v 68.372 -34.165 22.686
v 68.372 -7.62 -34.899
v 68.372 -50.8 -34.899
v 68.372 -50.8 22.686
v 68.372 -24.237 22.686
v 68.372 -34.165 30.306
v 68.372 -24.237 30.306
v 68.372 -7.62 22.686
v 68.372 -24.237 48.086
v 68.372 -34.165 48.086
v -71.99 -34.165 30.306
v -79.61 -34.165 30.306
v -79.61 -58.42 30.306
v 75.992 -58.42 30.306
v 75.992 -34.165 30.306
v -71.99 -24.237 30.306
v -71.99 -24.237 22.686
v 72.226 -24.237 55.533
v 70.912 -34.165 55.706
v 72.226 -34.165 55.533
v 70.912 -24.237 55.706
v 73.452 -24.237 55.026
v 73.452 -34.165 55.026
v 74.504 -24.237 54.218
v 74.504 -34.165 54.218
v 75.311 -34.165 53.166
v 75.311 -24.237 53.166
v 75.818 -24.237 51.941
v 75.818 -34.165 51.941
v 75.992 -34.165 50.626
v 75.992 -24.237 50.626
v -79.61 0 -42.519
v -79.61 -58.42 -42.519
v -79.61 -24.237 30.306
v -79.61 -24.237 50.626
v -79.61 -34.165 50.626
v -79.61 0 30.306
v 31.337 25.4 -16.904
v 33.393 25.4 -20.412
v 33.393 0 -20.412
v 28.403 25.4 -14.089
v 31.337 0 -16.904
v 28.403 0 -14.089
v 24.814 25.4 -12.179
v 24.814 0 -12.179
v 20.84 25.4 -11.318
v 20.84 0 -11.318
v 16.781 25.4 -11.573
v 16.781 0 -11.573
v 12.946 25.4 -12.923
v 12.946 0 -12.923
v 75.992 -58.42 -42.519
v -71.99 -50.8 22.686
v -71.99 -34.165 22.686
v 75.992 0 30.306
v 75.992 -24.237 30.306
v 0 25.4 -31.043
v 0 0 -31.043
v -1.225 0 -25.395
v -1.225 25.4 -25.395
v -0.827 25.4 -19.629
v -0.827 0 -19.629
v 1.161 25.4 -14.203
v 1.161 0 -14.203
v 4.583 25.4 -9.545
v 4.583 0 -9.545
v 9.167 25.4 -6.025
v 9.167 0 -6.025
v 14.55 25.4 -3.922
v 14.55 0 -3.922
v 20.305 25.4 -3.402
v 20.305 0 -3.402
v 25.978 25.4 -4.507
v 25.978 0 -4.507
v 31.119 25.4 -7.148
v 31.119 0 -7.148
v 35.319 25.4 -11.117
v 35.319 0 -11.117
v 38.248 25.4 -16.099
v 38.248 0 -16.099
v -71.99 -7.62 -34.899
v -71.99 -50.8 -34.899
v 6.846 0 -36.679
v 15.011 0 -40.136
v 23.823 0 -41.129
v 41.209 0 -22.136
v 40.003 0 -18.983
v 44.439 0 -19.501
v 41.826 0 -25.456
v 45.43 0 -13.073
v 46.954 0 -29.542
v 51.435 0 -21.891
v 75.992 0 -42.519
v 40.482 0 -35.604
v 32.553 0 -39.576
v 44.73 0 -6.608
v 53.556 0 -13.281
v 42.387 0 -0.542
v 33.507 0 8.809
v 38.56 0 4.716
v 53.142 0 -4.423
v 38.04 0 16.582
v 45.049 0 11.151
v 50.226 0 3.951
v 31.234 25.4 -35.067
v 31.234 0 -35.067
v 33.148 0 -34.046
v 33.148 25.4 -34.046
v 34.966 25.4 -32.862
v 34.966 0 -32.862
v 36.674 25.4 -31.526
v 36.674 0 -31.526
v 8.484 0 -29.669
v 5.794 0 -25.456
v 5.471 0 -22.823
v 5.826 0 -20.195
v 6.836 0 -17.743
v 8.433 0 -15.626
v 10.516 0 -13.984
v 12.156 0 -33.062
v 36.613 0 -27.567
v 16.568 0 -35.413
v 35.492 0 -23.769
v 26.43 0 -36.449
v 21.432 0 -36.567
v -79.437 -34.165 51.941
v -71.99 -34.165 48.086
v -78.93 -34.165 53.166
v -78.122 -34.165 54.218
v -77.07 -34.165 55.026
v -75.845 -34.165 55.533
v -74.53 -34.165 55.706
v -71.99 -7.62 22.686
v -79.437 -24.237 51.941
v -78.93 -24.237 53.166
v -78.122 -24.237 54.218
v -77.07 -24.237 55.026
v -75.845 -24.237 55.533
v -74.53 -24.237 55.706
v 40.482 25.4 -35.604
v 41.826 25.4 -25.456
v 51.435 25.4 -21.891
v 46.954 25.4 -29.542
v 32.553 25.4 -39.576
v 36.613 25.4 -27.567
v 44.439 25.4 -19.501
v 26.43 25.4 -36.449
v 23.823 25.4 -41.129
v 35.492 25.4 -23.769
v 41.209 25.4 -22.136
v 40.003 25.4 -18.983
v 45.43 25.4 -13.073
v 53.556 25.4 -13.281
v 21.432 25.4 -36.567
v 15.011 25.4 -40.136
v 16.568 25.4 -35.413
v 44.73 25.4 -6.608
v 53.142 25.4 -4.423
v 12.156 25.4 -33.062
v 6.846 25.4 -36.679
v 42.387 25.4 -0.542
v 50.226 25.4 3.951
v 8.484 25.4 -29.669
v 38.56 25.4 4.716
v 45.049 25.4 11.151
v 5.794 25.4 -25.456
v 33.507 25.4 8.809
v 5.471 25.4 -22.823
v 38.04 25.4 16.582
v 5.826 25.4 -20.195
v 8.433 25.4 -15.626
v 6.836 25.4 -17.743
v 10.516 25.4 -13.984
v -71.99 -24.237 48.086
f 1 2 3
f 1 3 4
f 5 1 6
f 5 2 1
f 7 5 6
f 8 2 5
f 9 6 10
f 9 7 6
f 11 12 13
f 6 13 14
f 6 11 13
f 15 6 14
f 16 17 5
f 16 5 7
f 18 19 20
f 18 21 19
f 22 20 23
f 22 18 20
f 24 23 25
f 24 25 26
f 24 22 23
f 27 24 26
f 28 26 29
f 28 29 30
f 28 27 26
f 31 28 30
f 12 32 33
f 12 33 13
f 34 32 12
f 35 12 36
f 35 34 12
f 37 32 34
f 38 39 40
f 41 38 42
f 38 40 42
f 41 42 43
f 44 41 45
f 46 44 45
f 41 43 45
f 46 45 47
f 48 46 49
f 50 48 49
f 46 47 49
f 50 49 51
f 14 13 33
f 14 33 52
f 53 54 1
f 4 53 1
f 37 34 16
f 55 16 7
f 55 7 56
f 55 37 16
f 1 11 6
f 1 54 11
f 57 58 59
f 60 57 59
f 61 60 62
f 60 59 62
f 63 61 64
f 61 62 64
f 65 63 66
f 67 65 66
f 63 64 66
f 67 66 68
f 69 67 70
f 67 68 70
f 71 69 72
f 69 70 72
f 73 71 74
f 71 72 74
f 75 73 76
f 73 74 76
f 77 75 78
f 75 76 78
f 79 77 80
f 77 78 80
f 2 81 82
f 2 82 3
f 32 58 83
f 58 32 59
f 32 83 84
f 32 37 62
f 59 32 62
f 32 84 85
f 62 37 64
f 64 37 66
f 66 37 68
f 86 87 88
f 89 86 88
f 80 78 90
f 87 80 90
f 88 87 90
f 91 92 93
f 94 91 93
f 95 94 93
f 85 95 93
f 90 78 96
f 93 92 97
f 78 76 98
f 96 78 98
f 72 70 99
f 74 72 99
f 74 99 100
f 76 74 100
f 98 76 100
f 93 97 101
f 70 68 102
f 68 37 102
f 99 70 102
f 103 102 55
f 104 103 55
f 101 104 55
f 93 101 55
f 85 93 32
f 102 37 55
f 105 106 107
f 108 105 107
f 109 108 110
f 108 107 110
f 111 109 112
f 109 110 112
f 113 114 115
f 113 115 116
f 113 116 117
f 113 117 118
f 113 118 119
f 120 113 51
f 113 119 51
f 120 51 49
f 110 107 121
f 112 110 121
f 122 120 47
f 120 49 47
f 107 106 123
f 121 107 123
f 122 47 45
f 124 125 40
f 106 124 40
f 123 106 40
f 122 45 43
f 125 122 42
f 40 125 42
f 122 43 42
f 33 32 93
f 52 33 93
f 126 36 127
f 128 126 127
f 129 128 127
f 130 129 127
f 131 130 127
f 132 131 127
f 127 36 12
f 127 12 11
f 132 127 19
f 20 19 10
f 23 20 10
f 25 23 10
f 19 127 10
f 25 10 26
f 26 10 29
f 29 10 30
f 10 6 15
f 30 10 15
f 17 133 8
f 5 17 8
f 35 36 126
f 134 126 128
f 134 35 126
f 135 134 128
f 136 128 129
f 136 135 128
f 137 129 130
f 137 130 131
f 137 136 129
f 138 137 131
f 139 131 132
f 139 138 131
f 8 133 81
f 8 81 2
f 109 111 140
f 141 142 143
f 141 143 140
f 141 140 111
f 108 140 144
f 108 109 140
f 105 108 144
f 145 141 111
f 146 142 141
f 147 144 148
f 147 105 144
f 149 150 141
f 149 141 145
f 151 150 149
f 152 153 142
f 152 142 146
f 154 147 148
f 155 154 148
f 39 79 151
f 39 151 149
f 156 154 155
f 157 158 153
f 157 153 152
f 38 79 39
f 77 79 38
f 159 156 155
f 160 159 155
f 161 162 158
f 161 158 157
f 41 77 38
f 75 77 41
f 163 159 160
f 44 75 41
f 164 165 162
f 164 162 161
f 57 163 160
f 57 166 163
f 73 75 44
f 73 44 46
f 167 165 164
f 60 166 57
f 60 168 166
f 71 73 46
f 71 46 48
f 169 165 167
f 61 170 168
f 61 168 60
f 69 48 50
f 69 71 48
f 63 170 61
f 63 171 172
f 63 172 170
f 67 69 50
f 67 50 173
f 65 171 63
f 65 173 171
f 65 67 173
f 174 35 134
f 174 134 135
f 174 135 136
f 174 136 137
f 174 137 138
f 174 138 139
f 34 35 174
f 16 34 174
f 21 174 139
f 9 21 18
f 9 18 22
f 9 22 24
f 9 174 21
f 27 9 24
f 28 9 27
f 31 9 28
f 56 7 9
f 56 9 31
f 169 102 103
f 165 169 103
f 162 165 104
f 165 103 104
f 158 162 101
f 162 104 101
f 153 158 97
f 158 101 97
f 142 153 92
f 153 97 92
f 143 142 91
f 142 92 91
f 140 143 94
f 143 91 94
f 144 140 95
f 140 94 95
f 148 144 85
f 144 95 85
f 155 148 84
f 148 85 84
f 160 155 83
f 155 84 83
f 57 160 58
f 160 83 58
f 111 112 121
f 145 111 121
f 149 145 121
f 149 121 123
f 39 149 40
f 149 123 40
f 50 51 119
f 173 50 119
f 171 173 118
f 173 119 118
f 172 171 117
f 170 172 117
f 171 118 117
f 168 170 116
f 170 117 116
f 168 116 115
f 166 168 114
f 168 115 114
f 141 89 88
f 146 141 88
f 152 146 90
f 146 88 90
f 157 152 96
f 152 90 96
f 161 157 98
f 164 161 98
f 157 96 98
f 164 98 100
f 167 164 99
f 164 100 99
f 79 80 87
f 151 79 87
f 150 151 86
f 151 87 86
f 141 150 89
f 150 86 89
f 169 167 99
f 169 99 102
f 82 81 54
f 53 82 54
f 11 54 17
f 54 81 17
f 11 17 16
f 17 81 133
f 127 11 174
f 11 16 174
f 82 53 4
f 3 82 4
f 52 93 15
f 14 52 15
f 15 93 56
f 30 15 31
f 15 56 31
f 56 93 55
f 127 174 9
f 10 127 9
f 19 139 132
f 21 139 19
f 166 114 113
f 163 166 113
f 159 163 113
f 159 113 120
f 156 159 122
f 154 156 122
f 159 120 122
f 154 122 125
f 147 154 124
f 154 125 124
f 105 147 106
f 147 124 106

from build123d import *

# Parameters (mm, degrees)
F0_W     = 155.6016728282
F0_H     = 72.8251989931
F1_DEPTH = 58.42
F2_W     = 155.6016728282
F2_H     = 9.92824696
F3_DEPTH = 25.4
F4_T     = 7.62
F5_R     = 5.08
F8_DEPTH = 25.4


# Not quite as in the source:
# - two fillets or chamfers of one size are made in one step
# - a shell that OpenCascade refuses in one call is made with other operations: the cavity is built on its own and cut out


with BuildPart() as f1:
    # F0 (on Front) → F1 (new body)
    with BuildSketch(Plane.XZ):
        with Locations((-1.8093250692, -6.1064558104)):
            Rectangle(F0_W, F0_H)
    extrude(amount=F1_DEPTH)

    # F2 (on face) → F3 (join)
    with BuildSketch(Plane.XY.offset(30.3061436862)):
        with Locations((-1.8093250692, -29.200729914)):
            Rectangle(F2_W, F2_H)
    extrude(amount=F3_DEPTH)

    # F4: shell of thickness 7.62, made by hand


with BuildPart() as f4_core1:
    # F4_t2: copy of F1
    add(f1.part)

    # the walls: a layer under each face that stays
    f4_faces = [f4_core1.faces().sort_by_distance(p)[0] for p in [
        (-1.8093250692, -12.118303217, 30.3061436862),
        (-1.8093250692, 0, -6.1064558104),
        (-79.6101614833, -29.21, 6.5935441896),
        (75.9915113449, -29.21, 6.5935441896),
        (-1.8093250692, -29.21, -42.5190553069),
        (-1.8093250692, -46.292426697, 30.3061436862),
        (-1.8093250692, -58.42, -6.1064558104),
        (-1.8093250692, -29.200729914, 55.7061436862),
    ]]
    thicken(f4_faces, amount=-F4_T, mode=Mode.SUBTRACT)


with BuildPart() as f1_1:
    add(f1.part)

    # what is left inside the walls is the cavity
    f4_cavity = [f4_core1.part.solids().sort_by_distance(p)[0] for p in [
        (-1.809325, -50.7238, -15.703989),
    ]]
    add(f4_cavity, mode=Mode.SUBTRACT)

    # F5
    f5_edges = [f1_1.edges().sort_by_distance(p)[0] for p in [
        (75.991511, -29.20073, 55.706144),
        (-79.610161, -29.20073, 55.706144),
    ]]
    fillet(f5_edges, radius=F5_R)

    # F7 (on face) → F8 (join)
    with BuildSketch(Plane(origin=(0, 0, 0), x_dir=(-1, 0, 0), z_dir=(0, 1, 0))):
        with BuildLine():
            Line((-33.5065312684, 8.8093429804), (-38.0396991968, 16.5818184614))
            ThreePointArc((-38.0396991968, 16.5818184614), (-46.9537485501, -29.5424136332), (0, -31.0426000506))
            ThreePointArc((0, -31.0426000506), (-11.7838373022, -4.7836219306), (-38.2480099797, -16.0991121083))
            ThreePointArc((-38.2480099797, -16.0991121083), (-40.6774615304, -20.5324220373), (-41.8258410886, -25.4556015134))
            ThreePointArc((-41.8258410886, -25.4556015134), (-44.7298971339, -6.6081053321), (-33.5065312684, 8.8093429804))
        make_face()
        with BuildLine():
            ThreePointArc((-31.2344189733, -35.0670516491), (-34.0695631474, -33.473512911), (-36.6739996827, -31.5256118532))
            ThreePointArc((-36.6739996827, -31.5256118532), (-36.1813498713, -25.629843598), (-33.3930179477, -20.4117987305))
            ThreePointArc((-33.3930179477, -20.4117987305), (-24.8135406655, -12.1786870208), (-12.9460245371, -12.9227433354))
            ThreePointArc((-12.9460245371, -12.9227433354), (-6.8355734632, -17.7428655691), (-5.7939905673, -25.4556015134))
            ThreePointArc((-5.7939905673, -25.4556015134), (-16.5679645446, -35.4128057466), (-31.2344189733, -35.0670516491))
        make_face(mode=Mode.SUBTRACT)
    extrude(amount=F8_DEPTH)


solid = f1_1.part
